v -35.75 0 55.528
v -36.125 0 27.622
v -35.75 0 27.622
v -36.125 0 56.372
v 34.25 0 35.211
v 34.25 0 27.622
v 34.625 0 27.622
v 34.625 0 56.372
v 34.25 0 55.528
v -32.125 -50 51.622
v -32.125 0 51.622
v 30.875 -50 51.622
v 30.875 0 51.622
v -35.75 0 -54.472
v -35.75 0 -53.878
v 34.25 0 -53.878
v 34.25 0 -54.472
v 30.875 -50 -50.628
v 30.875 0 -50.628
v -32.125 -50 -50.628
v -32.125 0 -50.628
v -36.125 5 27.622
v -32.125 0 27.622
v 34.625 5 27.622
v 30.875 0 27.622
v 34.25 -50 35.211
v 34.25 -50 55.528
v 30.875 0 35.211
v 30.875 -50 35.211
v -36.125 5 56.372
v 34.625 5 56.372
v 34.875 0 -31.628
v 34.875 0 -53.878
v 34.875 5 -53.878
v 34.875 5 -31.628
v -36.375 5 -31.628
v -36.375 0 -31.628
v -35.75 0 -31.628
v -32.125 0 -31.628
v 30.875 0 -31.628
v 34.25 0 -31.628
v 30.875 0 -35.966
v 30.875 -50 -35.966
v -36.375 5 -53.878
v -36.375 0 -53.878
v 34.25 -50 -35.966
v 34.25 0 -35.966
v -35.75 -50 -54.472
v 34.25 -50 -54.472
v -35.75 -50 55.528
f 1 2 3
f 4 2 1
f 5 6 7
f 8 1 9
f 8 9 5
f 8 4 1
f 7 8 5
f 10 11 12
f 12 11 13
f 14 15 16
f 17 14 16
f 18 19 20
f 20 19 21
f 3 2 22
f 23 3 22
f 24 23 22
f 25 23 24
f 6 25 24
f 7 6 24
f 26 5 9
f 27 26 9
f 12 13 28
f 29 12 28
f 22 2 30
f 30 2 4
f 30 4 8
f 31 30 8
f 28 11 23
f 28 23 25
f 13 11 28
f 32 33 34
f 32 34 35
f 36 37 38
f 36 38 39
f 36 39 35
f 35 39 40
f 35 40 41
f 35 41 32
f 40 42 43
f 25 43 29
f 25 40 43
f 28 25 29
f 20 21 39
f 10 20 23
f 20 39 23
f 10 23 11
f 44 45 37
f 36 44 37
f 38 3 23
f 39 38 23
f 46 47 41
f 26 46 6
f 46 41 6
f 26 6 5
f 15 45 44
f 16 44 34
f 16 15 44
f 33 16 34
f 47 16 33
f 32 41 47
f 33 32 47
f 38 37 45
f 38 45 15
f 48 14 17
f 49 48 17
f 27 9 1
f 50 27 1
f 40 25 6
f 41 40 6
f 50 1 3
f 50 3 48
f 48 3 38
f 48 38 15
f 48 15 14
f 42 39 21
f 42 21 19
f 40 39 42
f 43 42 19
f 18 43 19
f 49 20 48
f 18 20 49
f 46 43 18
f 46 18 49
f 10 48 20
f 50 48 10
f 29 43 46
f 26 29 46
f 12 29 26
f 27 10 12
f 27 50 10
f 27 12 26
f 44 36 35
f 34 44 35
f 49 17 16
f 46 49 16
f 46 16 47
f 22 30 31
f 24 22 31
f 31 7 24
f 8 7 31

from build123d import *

# Parameters (mm, degrees)
F0_W     = 3.624996
F0_H     = 71.177084
F0_W_2   = 3.375001
F1_DEPTH = 50
F2_DEPTH = 25
F3_W     = 70.750002
F3_H     = 28.750004
F3_W_2   = 71.250003
F3_H_2   = 22.250004
F4_DEPTH = 5


with BuildPart() as f1:
    # F0 (on Front) → F1 (new body)
    with BuildSketch(Plane.XZ):
        Polygon((34.25, 55.528098), (-35.75, 55.528098), (-35.75, 35.21125), (-32.125004, 35.21125), (-32.125004, 51.622394), (30.874999, 51.622394), (30.874999, 35.21125), (34.25, 35.21125), align=None)
        with Locations((-33.937502, -0.377292)):
            Rectangle(F0_W, F0_H)
        with Locations((32.5625, -0.377292)):
            Rectangle(F0_W_2, F0_H)
        Polygon((-32.125004, -35.965834), (-35.75, -35.965834), (-35.75, -54.471902), (34.25, -54.471902), (34.25, -35.965834), (30.874999, -35.965834), (30.874999, -50.627608), (-32.125004, -50.627608), align=None)
    extrude(amount=F1_DEPTH)

    # F0 (on Front) → F2 (join)
    with BuildSketch(Plane.XZ):
        Polygon((34.25, 55.528098), (-35.75, 55.528098), (-35.75, 35.21125), (-32.125004, 35.21125), (-32.125004, 51.622394), (30.874999, 51.622394), (30.874999, 35.21125), (34.25, 35.21125), align=None)
        with Locations((-33.937502, -0.377292)):
            Rectangle(F0_W, F0_H)
        with Locations((32.5625, -0.377292)):
            Rectangle(F0_W_2, F0_H)
        Polygon((-32.125004, -35.965834), (-35.75, -35.965834), (-35.75, -54.471902), (34.25, -54.471902), (34.25, -35.965834), (30.874999, -35.965834), (30.874999, -50.627608), (-32.125004, -50.627608), align=None)
    extrude(amount=F2_DEPTH)

    # F3 (on Front) → F4 (join)
    with BuildSketch(Plane.XZ):
        with Locations((-0.75, 41.997398)):
            Rectangle(F3_W, F3_H)
        with Locations((-0.75, -42.752605)):
            Rectangle(F3_W_2, F3_H_2)
    extrude(amount=-F4_DEPTH)


solid = f1.part
